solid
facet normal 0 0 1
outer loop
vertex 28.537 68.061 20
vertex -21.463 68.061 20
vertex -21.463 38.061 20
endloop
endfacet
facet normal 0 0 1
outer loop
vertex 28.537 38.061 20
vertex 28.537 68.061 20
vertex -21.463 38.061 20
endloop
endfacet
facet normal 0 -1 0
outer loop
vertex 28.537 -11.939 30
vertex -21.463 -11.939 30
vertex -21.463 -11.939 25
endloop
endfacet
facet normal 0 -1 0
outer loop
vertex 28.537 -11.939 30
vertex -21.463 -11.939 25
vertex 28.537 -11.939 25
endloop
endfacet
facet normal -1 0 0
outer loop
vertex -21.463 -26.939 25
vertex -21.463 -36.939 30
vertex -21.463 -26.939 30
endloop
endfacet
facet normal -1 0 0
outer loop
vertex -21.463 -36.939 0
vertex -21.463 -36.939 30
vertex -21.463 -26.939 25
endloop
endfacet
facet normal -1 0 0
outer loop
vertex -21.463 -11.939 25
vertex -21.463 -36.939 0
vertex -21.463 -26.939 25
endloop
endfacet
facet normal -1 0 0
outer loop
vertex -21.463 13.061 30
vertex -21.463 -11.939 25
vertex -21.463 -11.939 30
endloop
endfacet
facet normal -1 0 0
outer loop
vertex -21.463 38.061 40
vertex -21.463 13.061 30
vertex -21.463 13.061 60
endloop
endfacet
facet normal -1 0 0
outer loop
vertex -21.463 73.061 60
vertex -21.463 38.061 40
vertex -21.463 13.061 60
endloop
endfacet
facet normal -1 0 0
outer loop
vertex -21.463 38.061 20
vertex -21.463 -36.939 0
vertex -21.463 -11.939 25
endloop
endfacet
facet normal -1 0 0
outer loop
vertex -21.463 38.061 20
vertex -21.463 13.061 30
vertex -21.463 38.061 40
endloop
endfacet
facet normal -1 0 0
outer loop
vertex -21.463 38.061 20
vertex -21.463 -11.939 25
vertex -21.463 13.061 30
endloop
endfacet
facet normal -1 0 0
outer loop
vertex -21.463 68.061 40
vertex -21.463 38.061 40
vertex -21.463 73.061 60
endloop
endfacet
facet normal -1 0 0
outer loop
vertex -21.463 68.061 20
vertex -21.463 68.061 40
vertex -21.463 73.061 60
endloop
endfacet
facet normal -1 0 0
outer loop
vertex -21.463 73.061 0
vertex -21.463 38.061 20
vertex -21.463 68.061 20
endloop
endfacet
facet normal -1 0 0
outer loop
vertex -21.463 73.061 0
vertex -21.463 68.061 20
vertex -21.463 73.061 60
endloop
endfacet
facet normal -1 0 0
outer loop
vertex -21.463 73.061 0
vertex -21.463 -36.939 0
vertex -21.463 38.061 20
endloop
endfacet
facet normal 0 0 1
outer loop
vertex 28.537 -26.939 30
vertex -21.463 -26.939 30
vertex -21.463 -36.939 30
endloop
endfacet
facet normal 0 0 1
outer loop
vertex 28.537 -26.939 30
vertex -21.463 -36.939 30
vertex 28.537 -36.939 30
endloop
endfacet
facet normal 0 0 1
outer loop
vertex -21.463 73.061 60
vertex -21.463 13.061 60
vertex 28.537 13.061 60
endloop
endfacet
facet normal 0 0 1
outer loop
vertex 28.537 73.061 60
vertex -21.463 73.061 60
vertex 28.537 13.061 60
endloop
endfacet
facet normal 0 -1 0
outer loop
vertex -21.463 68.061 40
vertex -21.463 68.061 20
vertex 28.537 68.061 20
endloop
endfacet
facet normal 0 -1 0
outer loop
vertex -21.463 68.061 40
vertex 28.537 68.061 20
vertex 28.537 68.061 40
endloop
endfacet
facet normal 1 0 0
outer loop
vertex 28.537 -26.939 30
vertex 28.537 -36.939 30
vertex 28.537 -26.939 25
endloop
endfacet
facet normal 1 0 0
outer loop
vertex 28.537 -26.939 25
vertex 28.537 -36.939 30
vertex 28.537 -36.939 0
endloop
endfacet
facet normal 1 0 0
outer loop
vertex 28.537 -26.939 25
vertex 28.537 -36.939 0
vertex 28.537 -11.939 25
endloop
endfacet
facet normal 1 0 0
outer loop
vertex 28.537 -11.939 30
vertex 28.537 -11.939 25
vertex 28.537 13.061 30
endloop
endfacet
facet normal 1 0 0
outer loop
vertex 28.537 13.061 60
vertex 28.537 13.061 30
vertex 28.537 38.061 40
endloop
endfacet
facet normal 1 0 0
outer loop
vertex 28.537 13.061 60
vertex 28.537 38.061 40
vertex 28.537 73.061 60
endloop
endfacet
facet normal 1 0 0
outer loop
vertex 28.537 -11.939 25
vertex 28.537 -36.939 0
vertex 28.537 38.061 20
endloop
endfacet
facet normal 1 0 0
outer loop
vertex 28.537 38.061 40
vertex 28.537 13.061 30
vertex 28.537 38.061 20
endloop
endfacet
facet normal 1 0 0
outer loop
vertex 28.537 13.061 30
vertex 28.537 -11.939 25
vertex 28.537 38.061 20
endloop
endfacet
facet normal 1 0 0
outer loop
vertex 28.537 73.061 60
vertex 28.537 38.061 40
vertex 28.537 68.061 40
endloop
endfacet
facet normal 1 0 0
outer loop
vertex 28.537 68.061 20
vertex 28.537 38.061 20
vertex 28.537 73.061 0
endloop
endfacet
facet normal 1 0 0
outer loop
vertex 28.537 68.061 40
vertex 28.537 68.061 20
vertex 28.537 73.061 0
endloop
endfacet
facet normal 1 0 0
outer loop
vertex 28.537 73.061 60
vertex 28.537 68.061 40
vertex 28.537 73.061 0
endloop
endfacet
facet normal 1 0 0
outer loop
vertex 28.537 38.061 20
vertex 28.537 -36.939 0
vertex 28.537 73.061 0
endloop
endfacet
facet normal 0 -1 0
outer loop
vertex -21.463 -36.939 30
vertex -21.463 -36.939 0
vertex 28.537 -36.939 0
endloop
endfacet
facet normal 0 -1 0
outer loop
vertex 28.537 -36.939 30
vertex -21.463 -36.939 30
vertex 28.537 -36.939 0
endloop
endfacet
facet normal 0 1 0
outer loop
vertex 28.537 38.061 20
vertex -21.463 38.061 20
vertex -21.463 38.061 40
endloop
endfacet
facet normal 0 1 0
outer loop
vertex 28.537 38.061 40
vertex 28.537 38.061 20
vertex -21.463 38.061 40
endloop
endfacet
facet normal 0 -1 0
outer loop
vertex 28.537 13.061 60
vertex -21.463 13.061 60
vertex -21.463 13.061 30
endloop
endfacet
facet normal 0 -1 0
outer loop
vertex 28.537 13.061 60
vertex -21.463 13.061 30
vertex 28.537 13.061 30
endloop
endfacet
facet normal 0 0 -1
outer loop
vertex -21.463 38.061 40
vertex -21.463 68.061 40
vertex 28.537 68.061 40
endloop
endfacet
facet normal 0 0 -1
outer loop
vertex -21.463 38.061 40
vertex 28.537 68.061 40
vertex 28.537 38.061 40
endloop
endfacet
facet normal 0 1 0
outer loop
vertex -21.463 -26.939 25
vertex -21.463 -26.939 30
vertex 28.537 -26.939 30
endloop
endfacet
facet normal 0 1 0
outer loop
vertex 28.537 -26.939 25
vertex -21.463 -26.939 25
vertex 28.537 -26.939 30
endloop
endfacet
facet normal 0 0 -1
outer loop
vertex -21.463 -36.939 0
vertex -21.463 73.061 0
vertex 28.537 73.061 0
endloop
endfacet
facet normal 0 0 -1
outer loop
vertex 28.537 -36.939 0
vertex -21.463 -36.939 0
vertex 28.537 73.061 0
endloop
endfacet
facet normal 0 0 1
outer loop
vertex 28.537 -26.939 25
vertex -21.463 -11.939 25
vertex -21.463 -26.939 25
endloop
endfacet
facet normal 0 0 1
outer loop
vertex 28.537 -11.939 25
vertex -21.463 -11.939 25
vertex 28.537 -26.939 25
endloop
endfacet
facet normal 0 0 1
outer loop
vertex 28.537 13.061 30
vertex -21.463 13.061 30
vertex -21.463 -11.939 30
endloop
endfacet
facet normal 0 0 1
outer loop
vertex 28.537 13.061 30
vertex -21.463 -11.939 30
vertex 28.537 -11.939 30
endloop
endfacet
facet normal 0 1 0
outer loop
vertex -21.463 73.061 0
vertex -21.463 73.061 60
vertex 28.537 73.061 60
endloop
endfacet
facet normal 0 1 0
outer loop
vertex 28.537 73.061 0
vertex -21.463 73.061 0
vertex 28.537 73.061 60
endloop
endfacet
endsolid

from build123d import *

# Parameters (mm, degrees)
F0_W     = 50
F0_H     = 110
F1_DEPTH = 60
F2_W     = 50
F2_H     = 50
F3_DEPTH = 30
F4_W     = 50
F4_H     = 15
F5_DEPTH = 5
F6_W     = 30
F6_H     = 20
F7_DEPTH = 92


with BuildPart() as f1:
    # F0 (on Top) → F1 (new body)
    with BuildSketch(Plane.XY):
        with Locations((3.536819, 18.06074)):
            Rectangle(F0_W, F0_H)
    extrude(amount=F1_DEPTH)

    # F2 (on face) → F3 (cut)
    with BuildSketch(Plane.XY.offset(60)):
        with Locations((3.536819, -11.93926)):
            Rectangle(F2_W, F2_H)
    extrude(amount=-F3_DEPTH, mode=Mode.SUBTRACT)

    # F4 (on face) → F5 (cut)
    with BuildSketch(Plane.XY.offset(30)):
        with Locations((3.536819, -19.43926)):
            Rectangle(F4_W, F4_H)
    extrude(amount=-F5_DEPTH, mode=Mode.SUBTRACT)

    # F6 (on face) → F7 (cut)
    with BuildSketch(Plane(origin=(-21.463181, 0, 0), x_dir=(0, -1, 0), z_dir=(-1, 0, 0))):
        with Locations((-53.06074, 30)):
            Rectangle(F6_W, F6_H)
    extrude(amount=-F7_DEPTH, mode=Mode.SUBTRACT)


solid = f1.part
